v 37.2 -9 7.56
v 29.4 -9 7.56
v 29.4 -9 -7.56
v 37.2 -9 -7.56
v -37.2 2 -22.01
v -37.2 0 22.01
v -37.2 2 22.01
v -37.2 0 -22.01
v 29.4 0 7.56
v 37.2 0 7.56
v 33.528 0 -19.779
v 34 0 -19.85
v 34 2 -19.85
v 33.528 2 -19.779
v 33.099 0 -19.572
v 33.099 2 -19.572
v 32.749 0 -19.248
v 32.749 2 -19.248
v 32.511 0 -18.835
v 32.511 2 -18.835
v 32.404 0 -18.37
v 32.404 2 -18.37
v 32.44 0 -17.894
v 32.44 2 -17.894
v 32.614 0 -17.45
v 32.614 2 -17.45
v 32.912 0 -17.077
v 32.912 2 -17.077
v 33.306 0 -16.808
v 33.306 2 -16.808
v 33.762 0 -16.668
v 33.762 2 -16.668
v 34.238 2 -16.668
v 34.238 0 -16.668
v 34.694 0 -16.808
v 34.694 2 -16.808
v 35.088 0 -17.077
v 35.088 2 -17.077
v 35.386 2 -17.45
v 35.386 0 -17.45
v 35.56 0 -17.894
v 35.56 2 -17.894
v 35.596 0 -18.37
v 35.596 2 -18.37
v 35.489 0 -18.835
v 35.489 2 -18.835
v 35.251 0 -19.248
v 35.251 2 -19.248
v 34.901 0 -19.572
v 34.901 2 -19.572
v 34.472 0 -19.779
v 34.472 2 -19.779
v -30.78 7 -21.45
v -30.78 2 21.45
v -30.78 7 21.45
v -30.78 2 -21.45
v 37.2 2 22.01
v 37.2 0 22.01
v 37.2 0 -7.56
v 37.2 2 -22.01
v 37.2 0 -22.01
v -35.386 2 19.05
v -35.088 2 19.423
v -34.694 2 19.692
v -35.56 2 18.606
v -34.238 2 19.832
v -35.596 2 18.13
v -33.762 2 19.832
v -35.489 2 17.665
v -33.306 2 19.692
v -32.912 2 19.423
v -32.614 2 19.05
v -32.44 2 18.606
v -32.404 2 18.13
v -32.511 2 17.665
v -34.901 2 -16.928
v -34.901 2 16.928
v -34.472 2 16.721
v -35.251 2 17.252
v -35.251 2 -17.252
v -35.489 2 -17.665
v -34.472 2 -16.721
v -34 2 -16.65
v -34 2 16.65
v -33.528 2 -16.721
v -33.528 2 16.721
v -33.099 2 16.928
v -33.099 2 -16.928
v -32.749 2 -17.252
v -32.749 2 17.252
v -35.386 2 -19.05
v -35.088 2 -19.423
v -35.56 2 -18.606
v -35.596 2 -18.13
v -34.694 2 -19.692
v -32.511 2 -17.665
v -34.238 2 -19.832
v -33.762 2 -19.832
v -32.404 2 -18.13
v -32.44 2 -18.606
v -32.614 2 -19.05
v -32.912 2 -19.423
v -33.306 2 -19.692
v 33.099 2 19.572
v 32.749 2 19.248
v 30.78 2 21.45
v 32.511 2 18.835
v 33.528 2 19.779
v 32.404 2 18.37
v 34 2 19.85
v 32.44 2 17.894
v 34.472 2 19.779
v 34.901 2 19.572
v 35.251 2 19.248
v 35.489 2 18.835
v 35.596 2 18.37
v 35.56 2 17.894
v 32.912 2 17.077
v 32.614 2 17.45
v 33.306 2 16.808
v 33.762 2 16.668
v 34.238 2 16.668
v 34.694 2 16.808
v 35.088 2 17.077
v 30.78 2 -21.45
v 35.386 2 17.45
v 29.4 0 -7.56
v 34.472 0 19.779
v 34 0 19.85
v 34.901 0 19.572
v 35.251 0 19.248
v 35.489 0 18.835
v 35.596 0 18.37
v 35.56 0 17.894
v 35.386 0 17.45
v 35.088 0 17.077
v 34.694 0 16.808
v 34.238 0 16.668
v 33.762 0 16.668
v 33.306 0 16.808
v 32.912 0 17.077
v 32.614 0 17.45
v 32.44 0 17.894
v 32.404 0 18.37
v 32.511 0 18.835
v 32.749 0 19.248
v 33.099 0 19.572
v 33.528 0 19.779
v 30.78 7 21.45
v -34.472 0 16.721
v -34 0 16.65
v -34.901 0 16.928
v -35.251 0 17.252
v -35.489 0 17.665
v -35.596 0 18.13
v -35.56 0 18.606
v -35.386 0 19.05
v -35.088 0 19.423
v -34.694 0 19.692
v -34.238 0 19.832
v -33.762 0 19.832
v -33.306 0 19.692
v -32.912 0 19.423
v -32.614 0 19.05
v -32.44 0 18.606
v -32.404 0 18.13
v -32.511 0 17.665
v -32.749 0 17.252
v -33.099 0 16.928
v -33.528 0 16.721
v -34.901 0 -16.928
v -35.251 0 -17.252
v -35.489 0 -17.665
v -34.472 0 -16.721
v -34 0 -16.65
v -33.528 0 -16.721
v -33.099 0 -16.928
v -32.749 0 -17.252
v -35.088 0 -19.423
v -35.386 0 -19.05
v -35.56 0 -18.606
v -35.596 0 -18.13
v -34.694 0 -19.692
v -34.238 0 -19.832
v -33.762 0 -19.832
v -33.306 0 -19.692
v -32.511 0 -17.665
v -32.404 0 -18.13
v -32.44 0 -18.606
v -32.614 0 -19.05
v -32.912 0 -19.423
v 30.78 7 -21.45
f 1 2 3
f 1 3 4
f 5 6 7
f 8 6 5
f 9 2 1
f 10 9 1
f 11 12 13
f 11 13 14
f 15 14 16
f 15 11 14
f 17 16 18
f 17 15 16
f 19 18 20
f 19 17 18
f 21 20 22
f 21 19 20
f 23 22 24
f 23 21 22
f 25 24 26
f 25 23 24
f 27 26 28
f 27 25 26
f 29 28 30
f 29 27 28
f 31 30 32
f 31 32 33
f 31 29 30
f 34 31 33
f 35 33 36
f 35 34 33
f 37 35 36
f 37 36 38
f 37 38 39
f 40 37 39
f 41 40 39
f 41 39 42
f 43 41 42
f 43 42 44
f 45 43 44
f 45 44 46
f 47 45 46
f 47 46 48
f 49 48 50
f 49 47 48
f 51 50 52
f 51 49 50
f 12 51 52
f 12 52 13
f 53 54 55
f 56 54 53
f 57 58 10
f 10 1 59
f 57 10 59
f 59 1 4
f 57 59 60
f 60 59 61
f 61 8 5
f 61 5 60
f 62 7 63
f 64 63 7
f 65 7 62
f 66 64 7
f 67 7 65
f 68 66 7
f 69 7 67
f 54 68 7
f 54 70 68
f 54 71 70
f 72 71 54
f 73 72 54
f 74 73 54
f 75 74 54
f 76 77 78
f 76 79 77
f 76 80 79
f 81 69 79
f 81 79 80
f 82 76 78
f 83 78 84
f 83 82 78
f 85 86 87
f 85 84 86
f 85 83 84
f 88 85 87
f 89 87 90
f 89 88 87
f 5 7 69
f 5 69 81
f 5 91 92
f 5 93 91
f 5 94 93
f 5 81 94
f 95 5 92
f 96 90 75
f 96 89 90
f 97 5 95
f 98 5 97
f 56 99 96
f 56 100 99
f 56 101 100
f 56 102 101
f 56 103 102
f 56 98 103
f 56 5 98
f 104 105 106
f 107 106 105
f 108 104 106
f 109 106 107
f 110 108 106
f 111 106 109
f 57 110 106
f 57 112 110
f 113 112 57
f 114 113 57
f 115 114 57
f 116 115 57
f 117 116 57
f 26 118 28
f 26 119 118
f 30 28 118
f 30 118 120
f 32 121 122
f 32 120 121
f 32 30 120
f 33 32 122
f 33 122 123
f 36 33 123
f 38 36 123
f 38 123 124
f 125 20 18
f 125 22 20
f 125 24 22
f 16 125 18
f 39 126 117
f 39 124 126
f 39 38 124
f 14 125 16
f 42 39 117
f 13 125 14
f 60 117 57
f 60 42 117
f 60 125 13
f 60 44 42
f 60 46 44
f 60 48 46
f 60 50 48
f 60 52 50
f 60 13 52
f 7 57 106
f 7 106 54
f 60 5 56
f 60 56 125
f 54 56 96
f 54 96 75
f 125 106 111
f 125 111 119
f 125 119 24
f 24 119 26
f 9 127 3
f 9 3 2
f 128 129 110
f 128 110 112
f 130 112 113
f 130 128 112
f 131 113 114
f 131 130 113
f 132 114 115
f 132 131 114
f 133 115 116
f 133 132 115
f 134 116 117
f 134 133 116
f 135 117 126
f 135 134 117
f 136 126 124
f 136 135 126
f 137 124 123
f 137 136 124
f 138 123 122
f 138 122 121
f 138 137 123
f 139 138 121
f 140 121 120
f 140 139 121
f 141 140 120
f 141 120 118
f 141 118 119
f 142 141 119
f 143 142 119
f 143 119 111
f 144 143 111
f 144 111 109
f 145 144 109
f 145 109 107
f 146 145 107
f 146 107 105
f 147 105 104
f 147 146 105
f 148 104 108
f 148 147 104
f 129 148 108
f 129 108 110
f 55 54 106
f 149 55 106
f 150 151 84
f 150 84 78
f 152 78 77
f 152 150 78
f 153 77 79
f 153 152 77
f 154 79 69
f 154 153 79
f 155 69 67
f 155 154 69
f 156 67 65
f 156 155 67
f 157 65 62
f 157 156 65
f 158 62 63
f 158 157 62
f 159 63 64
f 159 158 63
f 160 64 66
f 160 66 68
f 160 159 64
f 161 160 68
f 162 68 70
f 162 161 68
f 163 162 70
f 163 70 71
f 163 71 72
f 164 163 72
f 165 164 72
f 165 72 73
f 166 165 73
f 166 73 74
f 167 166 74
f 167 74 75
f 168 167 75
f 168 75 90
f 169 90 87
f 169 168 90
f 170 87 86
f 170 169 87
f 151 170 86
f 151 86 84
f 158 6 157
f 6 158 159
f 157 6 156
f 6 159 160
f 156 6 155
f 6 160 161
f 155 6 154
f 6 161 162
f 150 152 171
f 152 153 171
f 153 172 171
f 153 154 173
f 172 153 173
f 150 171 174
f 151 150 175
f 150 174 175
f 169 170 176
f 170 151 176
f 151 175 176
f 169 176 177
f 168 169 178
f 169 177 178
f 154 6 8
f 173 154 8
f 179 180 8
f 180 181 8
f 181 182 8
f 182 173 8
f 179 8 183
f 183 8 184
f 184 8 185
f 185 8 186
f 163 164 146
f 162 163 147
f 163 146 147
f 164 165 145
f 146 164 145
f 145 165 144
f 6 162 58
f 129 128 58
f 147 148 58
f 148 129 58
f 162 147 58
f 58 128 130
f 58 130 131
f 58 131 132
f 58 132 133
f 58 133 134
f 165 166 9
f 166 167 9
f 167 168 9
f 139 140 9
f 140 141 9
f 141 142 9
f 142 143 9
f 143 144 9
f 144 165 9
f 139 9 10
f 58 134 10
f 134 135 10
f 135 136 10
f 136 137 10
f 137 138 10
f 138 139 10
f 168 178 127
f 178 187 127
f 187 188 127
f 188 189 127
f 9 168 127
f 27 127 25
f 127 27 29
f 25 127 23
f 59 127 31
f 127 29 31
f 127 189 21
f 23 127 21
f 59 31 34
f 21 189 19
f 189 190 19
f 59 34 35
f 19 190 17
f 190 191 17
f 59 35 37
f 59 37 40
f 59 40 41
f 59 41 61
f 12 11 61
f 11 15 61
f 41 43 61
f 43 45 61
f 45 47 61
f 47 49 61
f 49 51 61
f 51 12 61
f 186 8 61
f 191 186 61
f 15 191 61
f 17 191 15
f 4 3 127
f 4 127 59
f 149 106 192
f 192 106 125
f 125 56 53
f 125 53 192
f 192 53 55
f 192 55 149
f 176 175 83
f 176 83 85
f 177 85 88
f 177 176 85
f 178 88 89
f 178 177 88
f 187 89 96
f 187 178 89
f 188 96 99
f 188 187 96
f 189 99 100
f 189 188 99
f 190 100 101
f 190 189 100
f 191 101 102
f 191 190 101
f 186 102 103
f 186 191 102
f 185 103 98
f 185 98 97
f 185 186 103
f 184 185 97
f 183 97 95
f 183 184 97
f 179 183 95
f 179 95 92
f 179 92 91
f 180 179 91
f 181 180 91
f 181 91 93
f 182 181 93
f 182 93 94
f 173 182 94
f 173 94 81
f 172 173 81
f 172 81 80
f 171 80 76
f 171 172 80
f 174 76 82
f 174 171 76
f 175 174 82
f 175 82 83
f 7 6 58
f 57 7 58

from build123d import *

# Parameters (mm, degrees)
SKETCH_1_W      = 74.4
SKETCH_1_H      = 44.02
SKETCH_1_R      = 1.6
EXTRUDE_1_DEPTH = 2
SKETCH_2_W      = 61.56
SKETCH_2_H      = 42.9
EXTRUDE_2_DEPTH = 5
SKETCH_3_W      = 7.8
SKETCH_3_H      = 15.12
EXTRUDE_3_DEPTH = 9


with BuildPart() as part:
    # 草图1 → 凸台-拉伸1 (new body)
    with BuildSketch(Plane(origin=(0, 0, 0), x_dir=(1, 0, 0), z_dir=(0, 1, 0))):
        Rectangle(SKETCH_1_W, SKETCH_1_H)
        with Locations(Location((-34, 18.25, 0), (0, 0, 270))):
            Circle(SKETCH_1_R, mode=Mode.SUBTRACT)
        with Locations(Location((34, 18.25, 0), (0, 0, 90))):
            Circle(SKETCH_1_R, mode=Mode.SUBTRACT)
        with Locations(Location((34, -18.25, 0), (0, 0, 270))):
            Circle(SKETCH_1_R, mode=Mode.SUBTRACT)
        with Locations(Location((-34, -18.25, 0), (0, 0, 90))):
            Circle(SKETCH_1_R, mode=Mode.SUBTRACT)
    extrude(amount=EXTRUDE_1_DEPTH)

    # 草图2 → 凸台-拉伸2 (add)
    with BuildSketch(Plane(origin=(0, 2, 0), x_dir=(1, 0, 0), z_dir=(0, 1, 0))):
        Rectangle(SKETCH_2_W, SKETCH_2_H)
    extrude(amount=EXTRUDE_2_DEPTH)

    # 草图3 → 凸台-拉伸3 (add)
    with BuildSketch(Plane.XZ):
        with Locations((33.3, 0)):
            Rectangle(SKETCH_3_W, SKETCH_3_H)
    extrude(amount=EXTRUDE_3_DEPTH)


solid = part.part
